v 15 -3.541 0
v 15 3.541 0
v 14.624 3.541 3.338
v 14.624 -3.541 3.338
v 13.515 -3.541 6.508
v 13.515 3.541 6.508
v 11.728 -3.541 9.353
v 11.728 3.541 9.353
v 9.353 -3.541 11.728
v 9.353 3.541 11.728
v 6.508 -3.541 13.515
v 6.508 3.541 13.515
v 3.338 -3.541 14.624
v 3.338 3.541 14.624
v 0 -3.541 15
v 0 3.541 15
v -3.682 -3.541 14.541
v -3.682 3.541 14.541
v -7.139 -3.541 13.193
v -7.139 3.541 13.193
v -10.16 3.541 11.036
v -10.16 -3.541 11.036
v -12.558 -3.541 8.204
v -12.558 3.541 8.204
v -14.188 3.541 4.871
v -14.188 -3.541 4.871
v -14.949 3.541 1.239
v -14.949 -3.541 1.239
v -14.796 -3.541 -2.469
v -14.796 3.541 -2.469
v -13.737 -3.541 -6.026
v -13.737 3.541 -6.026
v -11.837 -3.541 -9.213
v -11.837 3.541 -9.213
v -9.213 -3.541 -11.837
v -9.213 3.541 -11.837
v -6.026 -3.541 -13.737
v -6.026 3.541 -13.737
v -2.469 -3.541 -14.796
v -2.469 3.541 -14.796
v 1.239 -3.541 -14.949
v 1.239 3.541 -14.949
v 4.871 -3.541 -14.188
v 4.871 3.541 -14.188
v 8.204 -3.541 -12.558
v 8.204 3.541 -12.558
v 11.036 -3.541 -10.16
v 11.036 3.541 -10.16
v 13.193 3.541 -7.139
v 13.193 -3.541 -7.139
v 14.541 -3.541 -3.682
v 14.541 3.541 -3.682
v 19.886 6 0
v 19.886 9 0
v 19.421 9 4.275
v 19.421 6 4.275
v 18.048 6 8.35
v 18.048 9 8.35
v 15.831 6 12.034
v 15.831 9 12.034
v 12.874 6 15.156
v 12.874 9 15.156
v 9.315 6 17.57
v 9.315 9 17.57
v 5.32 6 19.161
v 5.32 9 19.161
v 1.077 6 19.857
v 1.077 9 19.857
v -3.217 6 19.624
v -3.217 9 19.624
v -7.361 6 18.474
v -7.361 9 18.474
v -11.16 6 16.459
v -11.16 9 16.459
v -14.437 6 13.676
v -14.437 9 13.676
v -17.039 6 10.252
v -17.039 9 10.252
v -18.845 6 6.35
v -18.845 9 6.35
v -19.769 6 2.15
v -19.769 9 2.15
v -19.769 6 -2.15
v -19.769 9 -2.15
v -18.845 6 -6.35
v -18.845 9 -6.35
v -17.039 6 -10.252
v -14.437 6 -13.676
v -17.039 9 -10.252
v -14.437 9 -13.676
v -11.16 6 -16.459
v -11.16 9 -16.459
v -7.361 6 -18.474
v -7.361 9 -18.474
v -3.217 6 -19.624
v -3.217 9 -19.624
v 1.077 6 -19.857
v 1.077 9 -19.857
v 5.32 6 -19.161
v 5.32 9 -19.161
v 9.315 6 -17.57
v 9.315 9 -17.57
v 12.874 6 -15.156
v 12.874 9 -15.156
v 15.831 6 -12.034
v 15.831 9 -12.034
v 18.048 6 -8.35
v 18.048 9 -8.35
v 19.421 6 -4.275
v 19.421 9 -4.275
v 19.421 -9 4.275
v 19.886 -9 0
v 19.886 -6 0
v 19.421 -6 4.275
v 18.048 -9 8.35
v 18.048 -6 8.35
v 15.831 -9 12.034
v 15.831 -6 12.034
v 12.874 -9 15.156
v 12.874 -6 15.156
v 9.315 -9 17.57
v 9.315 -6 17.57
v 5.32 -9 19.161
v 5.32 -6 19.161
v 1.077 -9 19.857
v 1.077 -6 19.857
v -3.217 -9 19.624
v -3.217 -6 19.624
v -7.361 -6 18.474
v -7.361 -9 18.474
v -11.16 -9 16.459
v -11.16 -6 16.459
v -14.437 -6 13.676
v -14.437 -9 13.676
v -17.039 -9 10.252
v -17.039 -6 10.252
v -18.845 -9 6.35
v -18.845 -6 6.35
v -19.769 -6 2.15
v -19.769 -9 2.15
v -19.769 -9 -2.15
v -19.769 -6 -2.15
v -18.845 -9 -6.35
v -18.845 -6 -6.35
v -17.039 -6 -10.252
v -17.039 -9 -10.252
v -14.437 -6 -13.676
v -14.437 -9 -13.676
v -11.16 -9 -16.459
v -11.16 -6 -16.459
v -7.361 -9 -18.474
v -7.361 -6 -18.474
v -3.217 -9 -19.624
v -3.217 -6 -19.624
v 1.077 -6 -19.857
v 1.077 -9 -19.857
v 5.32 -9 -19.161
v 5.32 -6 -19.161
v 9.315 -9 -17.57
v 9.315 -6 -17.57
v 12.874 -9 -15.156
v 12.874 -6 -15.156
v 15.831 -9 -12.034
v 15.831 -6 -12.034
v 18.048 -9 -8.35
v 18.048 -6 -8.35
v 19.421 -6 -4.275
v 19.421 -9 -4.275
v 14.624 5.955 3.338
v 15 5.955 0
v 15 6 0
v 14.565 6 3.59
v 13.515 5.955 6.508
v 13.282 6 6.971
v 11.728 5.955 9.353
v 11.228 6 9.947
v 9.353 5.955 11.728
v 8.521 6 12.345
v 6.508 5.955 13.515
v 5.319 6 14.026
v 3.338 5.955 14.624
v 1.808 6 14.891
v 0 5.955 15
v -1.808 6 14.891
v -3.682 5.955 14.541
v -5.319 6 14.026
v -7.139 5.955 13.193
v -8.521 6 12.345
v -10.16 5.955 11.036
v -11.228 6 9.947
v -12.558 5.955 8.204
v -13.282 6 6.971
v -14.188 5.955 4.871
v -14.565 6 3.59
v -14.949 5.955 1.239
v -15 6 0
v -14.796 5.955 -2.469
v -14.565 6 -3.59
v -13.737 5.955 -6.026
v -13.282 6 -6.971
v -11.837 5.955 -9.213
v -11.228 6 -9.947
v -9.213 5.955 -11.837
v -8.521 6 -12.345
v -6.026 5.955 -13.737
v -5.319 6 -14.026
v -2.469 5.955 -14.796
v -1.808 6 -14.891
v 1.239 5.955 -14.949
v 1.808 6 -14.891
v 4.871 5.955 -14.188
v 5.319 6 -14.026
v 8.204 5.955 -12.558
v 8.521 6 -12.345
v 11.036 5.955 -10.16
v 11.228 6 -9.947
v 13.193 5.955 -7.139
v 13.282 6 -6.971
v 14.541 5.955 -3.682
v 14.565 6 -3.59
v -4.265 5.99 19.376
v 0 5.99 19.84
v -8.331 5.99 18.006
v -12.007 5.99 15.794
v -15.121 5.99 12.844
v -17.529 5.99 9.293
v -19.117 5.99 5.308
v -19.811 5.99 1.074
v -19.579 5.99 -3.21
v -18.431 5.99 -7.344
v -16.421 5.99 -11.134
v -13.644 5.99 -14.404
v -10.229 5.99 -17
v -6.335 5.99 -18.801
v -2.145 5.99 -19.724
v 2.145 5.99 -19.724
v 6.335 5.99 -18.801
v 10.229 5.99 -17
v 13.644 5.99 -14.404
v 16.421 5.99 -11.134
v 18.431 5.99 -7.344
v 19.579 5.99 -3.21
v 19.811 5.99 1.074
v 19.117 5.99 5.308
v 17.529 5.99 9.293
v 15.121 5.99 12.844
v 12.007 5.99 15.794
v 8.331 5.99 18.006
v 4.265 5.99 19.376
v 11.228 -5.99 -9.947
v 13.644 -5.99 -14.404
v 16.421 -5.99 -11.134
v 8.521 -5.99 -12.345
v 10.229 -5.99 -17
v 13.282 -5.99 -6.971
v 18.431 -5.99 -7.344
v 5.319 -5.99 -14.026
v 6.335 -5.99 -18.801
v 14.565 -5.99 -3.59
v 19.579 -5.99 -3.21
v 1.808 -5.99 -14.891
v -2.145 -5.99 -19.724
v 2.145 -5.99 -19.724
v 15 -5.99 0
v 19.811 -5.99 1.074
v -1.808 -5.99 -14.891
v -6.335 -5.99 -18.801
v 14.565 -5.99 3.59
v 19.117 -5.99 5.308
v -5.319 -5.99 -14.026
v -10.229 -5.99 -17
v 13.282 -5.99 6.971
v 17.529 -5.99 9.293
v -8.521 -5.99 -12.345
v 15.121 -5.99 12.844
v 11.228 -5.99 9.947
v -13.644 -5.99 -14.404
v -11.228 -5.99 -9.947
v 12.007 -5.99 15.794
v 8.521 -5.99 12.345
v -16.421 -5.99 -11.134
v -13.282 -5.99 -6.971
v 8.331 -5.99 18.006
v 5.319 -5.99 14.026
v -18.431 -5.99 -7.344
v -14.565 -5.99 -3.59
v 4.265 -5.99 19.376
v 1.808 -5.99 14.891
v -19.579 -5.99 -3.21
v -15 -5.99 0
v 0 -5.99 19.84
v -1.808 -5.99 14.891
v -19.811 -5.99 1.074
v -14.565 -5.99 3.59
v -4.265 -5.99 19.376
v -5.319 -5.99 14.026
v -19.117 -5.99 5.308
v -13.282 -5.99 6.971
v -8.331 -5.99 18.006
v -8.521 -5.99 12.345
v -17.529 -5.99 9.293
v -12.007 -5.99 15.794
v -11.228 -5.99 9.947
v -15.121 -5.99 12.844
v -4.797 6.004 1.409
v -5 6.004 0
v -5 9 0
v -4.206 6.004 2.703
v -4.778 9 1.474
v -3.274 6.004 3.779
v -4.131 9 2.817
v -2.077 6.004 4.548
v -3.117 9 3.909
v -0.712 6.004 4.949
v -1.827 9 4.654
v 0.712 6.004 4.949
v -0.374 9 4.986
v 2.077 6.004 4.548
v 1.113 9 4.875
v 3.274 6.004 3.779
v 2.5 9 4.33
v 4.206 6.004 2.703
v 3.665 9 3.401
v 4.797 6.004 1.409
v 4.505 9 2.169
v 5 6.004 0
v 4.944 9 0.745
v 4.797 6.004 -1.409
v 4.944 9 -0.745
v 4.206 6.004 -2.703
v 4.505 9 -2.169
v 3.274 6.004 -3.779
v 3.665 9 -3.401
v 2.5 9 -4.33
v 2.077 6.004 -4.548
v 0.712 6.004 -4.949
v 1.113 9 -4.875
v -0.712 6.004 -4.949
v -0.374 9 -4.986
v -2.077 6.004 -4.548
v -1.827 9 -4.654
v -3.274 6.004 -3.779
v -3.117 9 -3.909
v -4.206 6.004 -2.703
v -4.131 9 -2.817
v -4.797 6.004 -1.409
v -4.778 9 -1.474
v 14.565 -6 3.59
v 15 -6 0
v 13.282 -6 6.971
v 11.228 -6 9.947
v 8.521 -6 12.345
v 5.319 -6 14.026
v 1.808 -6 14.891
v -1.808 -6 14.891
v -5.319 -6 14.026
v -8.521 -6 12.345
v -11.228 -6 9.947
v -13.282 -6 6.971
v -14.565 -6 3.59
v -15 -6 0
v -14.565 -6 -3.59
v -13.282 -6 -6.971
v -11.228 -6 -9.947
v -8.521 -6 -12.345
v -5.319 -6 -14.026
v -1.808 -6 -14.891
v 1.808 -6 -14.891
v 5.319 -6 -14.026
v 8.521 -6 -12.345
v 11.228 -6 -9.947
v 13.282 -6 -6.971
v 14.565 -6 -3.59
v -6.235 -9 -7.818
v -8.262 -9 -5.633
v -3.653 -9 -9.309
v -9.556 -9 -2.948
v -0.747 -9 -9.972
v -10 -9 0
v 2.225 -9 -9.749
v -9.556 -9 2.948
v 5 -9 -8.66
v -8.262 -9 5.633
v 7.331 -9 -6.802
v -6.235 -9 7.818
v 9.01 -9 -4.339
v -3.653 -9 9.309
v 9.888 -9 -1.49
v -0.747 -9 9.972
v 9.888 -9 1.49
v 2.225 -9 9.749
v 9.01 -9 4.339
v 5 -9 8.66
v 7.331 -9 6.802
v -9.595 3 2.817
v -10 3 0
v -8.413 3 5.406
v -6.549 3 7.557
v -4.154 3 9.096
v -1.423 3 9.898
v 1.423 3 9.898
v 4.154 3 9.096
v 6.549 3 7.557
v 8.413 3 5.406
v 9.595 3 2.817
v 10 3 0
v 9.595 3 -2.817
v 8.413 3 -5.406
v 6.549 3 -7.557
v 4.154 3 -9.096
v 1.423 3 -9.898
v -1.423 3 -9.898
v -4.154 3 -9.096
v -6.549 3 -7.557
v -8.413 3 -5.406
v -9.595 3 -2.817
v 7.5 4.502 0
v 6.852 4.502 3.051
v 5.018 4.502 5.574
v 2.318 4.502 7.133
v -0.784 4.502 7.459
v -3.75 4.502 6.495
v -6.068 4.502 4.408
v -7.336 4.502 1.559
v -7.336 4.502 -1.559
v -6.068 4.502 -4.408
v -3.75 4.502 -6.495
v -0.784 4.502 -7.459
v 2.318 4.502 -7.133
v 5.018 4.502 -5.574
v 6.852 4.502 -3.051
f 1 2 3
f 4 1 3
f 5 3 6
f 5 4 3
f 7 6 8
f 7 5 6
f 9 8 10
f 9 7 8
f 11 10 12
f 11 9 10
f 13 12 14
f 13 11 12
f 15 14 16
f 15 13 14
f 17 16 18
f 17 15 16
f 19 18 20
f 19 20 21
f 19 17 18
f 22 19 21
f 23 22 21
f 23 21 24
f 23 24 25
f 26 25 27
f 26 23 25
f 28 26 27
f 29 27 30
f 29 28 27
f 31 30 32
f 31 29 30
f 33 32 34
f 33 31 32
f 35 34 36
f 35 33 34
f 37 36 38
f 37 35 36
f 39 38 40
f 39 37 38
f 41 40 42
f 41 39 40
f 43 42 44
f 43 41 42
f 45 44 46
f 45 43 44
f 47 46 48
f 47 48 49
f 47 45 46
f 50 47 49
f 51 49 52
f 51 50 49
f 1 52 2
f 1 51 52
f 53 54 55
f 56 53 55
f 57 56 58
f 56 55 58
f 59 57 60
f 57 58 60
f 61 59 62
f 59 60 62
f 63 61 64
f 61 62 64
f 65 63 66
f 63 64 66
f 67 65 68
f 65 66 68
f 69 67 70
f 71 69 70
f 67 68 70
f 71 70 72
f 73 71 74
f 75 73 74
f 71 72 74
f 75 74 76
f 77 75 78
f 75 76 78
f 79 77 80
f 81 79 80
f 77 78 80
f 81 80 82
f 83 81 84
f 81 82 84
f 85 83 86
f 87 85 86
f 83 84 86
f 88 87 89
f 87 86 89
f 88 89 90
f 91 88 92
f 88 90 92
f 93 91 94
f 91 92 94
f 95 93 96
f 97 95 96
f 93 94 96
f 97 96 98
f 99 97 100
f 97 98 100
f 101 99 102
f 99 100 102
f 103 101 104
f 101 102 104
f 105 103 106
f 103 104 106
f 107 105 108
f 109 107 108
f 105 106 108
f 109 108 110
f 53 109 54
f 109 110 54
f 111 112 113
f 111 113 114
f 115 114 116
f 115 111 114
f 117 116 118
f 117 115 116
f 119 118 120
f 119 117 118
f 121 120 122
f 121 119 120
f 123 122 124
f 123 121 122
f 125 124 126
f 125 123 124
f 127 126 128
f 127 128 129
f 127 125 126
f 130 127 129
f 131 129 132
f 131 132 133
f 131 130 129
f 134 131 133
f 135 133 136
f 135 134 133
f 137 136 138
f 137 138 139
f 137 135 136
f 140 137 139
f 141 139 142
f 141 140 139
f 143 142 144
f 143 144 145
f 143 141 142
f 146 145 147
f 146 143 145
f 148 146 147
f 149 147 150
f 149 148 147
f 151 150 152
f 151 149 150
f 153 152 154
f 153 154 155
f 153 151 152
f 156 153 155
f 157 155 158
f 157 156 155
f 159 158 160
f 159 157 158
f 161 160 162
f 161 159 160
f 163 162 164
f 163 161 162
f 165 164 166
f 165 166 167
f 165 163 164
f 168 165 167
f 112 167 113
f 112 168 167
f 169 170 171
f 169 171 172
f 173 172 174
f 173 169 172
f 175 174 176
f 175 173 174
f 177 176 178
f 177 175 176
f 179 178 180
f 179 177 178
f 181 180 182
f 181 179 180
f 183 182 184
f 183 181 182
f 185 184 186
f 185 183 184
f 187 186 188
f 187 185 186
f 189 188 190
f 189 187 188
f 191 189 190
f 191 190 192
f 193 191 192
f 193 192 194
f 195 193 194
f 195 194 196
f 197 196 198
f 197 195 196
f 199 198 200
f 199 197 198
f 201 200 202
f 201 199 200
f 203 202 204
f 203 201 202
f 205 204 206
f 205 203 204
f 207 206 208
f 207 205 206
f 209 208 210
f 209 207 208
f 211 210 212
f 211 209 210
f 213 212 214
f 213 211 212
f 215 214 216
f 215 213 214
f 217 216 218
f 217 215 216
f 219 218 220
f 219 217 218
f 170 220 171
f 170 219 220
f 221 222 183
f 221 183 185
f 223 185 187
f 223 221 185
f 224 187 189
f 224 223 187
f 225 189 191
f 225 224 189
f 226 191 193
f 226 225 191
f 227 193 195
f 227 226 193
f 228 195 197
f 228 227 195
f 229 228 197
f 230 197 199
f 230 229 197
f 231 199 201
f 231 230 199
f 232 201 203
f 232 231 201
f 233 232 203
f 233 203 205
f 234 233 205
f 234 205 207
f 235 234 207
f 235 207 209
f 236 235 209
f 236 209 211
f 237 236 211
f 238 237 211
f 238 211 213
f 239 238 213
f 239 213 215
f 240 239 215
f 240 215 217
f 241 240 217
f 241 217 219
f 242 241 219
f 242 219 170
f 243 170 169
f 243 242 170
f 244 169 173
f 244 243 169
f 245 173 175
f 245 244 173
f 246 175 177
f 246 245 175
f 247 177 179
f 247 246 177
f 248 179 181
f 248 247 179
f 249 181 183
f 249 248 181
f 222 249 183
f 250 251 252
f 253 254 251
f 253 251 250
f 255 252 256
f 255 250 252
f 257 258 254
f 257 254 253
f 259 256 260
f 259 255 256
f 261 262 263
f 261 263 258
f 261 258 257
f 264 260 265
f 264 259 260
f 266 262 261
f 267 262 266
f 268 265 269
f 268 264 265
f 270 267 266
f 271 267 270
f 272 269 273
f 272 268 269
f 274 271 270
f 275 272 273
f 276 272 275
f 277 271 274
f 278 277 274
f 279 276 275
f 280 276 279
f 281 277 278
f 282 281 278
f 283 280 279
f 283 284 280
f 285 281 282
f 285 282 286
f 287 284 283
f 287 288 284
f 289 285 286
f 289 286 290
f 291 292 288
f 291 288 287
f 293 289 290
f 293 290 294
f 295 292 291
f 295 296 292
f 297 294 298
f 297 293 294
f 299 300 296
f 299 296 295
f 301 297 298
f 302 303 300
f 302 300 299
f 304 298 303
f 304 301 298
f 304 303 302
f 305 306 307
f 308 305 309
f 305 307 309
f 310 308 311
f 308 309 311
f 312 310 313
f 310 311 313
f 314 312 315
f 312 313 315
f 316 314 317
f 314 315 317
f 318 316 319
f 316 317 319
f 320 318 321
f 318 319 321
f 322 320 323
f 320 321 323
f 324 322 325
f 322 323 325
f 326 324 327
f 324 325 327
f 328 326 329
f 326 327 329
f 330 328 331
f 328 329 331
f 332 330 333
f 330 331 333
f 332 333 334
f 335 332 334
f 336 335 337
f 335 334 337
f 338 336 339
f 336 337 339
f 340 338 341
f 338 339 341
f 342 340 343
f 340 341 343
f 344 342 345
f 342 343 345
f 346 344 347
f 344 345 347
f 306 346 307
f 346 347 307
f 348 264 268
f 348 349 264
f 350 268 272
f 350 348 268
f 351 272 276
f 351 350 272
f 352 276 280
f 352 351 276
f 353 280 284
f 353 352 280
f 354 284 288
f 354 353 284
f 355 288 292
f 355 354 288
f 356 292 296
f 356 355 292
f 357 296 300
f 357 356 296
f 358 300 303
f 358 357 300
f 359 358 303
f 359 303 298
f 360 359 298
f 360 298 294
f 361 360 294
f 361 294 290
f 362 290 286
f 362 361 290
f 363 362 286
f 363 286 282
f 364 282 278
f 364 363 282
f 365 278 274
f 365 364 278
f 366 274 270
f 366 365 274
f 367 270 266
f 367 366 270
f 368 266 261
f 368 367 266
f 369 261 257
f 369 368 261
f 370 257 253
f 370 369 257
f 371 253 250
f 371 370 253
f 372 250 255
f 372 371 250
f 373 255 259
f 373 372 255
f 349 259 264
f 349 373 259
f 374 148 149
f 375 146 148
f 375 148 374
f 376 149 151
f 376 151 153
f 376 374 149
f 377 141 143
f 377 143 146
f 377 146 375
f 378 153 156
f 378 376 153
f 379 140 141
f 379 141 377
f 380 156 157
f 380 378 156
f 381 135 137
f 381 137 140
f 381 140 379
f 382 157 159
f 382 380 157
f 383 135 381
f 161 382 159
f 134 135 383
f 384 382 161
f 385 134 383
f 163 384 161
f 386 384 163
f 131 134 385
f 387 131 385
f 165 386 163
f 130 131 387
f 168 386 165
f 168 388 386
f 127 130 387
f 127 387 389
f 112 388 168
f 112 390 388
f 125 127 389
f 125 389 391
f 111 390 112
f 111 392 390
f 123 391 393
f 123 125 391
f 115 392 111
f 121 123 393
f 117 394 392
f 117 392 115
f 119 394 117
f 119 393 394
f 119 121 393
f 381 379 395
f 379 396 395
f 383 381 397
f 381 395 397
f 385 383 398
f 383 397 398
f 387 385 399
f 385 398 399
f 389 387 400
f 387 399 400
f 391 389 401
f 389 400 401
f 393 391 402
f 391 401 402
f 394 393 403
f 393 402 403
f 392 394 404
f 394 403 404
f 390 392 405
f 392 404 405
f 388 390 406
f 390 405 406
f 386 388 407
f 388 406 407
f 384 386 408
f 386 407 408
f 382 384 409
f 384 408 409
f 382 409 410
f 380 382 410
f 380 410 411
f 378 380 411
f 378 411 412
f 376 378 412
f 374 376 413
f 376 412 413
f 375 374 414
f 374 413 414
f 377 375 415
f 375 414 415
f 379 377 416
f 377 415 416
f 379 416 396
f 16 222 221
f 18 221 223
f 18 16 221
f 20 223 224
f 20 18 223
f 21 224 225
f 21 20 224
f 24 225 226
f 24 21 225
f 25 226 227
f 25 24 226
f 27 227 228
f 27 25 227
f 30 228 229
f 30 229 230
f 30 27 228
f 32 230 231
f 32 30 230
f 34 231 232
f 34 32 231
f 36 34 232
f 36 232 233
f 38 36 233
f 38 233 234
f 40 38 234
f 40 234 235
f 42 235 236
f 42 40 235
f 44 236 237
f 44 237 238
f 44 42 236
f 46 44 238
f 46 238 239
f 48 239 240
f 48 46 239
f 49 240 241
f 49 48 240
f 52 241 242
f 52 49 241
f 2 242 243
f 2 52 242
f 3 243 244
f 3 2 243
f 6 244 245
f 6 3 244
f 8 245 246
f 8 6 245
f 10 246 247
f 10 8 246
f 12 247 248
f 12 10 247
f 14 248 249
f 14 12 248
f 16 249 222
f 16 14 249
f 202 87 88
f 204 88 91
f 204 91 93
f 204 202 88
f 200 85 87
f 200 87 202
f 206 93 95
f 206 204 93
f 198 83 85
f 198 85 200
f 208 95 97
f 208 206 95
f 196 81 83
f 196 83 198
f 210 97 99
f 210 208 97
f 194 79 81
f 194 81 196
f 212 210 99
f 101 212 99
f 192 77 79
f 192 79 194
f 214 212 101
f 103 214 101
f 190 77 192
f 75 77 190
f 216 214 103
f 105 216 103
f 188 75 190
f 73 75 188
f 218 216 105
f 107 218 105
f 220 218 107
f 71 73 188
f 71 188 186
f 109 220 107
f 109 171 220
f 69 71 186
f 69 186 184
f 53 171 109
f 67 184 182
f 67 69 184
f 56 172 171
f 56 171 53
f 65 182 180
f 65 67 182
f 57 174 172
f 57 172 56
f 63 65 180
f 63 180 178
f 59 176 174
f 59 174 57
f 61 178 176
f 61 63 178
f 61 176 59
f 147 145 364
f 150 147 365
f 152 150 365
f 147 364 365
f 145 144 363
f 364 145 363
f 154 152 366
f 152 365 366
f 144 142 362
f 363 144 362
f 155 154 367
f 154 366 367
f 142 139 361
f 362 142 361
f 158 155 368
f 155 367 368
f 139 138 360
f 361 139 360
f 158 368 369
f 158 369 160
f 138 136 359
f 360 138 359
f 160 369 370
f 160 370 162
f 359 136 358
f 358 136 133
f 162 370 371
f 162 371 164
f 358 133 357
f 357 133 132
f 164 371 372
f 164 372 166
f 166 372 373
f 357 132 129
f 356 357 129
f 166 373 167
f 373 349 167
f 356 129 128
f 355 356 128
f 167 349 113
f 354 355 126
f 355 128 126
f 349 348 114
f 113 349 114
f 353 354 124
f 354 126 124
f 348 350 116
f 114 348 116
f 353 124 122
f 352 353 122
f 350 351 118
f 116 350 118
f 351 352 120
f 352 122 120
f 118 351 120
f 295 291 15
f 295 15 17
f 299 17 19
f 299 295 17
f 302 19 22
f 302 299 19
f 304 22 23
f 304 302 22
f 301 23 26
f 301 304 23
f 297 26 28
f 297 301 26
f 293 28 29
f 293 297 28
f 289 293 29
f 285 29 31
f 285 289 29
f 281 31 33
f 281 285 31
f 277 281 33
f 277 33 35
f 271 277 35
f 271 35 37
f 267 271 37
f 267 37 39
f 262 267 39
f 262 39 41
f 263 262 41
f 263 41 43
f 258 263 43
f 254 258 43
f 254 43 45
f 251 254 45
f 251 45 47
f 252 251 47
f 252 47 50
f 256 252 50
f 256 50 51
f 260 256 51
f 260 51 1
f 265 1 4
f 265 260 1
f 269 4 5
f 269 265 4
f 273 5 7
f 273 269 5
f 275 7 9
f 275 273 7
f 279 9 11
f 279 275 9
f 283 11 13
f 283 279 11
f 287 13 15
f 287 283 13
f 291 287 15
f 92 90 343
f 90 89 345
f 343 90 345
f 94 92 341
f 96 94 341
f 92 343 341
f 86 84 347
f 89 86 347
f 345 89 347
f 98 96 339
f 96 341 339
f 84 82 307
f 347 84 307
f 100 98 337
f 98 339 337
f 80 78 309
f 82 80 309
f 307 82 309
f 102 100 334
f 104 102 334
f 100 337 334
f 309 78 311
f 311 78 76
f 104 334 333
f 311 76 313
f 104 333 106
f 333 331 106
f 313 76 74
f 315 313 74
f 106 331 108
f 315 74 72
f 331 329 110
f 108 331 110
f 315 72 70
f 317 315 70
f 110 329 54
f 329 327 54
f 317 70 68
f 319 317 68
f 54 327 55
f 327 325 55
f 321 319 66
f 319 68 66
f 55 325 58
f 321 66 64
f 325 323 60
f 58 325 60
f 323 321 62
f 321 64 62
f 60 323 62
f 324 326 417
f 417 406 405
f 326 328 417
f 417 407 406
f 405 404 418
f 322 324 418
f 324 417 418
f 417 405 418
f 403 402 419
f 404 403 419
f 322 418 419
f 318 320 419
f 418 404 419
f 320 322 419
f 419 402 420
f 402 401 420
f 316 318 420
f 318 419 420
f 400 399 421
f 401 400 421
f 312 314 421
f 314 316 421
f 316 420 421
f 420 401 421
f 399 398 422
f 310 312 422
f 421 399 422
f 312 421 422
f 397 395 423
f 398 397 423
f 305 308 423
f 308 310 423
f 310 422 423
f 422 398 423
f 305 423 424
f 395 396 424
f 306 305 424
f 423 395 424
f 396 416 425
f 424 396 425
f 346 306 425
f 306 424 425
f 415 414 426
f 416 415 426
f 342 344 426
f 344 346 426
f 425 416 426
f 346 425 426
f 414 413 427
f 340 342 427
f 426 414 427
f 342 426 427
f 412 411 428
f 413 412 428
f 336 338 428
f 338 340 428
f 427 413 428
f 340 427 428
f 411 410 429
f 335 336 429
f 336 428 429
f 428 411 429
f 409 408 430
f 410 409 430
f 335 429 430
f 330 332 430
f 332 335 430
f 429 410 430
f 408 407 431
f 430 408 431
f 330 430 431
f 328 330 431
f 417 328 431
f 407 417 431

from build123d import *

# Parameters (mm, degrees)
F0_R     = 15.0004726412
F0_R_2   = 9.9068563463
F0_R_3   = 5.0694396424
F1_DEPTH = 9
F2_R     = 19.8859945384
F2_R_2   = 15.0004726412
F3_DEPTH = 3
F7_D     = 10
F8_D     = 20
F8_DEPTH = 12
F8_TIP   = 6.0086061903


with BuildPart() as f1:
    # F0 (on Front) → F1 (new body, symmetric)
    with BuildSketch(Plane.XZ):
        Circle(F0_R)
        Circle(F0_R_2, mode=Mode.SUBTRACT)
        Circle(F0_R_2)
        Circle(F0_R_3, mode=Mode.SUBTRACT)
        Circle(F0_R_3)
    extrude(amount=F1_DEPTH, both=True)

    # F2 (on face) → F3 (join)
    with BuildSketch(Plane.XZ.offset(9)):
        Circle(F2_R)
        Circle(F2_R_2, mode=Mode.SUBTRACT)
    extrude(amount=-F3_DEPTH)

    # F4: F1 across plane


with BuildPart() as f1_1:
    add(f1.part)
    add(f1.part.mirror(Plane.XZ))

    # F5 (on Right) → F6 (revolve)
    with BuildSketch(Plane.YZ):
        Polygon((-3.5, 14.9199490446), (-5.9903608635, 19.839907065), (-5.9903608635, 14.9199490446), align=None)
        Polygon((5.9543419629, 14.9199490446), (5.9903608635, 19.839907065), (3.5, 14.9199490446), align=None)
    revolve(axis=Axis((0, 0, 0), (0, -1, 0)))

    # F7 (through all)
    with Locations(Plane.XZ.offset(9)):
        with Locations((0, 0)):
            Hole(F7_D / 2)

    # F8
    with Locations(Plane.XZ.offset(9)):
        with Locations((0, 0)):
            Hole(F8_D / 2, depth=F8_DEPTH)
            with Locations((0, 0, -(F8_DEPTH + F8_TIP / 2))):  # 118° drill point
                Cone(0, F8_D / 2, F8_TIP, mode=Mode.SUBTRACT)


solid = f1_1.part
